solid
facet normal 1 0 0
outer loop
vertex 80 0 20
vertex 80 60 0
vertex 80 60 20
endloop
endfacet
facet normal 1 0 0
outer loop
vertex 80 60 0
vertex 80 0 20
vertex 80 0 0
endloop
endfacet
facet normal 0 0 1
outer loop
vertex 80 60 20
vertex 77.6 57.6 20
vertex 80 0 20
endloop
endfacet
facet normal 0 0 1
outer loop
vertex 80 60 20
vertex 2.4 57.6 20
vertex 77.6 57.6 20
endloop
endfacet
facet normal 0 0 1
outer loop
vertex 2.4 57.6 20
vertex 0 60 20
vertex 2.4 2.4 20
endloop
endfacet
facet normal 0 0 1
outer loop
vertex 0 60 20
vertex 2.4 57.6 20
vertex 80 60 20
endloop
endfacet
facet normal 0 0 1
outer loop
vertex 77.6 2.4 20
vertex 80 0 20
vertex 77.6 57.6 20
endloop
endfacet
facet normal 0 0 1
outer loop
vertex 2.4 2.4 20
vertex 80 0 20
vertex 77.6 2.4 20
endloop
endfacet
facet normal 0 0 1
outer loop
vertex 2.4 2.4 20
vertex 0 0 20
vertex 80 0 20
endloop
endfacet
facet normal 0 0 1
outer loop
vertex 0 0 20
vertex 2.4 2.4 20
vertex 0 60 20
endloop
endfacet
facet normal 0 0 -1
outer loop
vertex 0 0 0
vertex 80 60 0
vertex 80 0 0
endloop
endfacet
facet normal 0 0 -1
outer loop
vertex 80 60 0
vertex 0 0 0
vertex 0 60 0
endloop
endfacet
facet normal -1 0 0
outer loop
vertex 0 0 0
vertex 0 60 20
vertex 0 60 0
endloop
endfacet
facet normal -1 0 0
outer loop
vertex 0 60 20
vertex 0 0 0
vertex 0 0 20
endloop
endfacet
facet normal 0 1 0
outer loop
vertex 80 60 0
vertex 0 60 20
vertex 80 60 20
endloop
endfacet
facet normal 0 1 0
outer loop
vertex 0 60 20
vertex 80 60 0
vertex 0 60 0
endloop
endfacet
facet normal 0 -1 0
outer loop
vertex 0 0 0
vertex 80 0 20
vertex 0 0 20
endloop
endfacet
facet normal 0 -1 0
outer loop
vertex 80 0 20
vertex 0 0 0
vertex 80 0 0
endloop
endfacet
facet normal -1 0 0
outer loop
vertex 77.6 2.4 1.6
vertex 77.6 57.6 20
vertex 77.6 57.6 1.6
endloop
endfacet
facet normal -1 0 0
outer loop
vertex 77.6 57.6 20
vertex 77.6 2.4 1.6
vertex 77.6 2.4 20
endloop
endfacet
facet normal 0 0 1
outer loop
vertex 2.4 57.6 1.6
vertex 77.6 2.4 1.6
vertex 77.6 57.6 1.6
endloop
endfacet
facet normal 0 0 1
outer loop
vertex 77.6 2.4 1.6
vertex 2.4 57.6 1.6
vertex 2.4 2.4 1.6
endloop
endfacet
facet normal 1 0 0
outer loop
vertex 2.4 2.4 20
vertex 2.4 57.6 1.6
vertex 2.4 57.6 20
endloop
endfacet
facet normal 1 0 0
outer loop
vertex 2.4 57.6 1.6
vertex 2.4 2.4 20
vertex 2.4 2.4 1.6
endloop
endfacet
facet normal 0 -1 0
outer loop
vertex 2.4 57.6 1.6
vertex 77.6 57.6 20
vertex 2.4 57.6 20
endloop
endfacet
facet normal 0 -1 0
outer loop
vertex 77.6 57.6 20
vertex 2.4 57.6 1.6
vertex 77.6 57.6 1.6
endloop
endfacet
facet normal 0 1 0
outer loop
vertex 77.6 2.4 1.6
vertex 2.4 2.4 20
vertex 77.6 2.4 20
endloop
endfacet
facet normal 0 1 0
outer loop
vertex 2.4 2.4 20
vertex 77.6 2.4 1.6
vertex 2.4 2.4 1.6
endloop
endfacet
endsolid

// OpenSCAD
// A parts tray. defect=true leaves its floor hanging from three tabs.
defect = false;
size = [80, 60, 20];
wall = 2.4;
floor_t = 1.6;
slit = 0.8;
tab = 3;

echo(cadverify_spec = [
    ["bounds", [[0, 0, 0], size]],
    ["bodies", 1],
    ["through_holes", defect ? 3 : 0],
    ["material", "PLA"]
]);

module shell() {
    difference() {
        cube(size);
        translate([wall, wall, floor_t]) cube([size[0] - 2 * wall, size[1] - 2 * wall, size[2]]);
    }
}

module slit_ring() {
    translate([wall, wall, -1]) difference() {
        cube([size[0] - 2 * wall, size[1] - 2 * wall, floor_t + 2]);
        translate([slit, slit, -1])
            cube([size[0] - 2 * wall - 2 * slit, size[1] - 2 * wall - 2 * slit, floor_t + 4]);
    }
}

module tabs() {
    translate([size[0] / 2 - tab / 2, wall - 0.5, 0]) cube([tab, slit + 1, floor_t]);
    translate([wall - 0.5, size[1] * 0.75, 0]) cube([slit + 1, tab, floor_t]);
    translate([size[0] - wall - slit - 0.5, size[1] * 0.25, 0]) cube([slit + 1, tab, floor_t]);
}

if (defect) {
    difference() {
        shell();
        slit_ring();
    }
    tabs();
} else {
    shell();
}
